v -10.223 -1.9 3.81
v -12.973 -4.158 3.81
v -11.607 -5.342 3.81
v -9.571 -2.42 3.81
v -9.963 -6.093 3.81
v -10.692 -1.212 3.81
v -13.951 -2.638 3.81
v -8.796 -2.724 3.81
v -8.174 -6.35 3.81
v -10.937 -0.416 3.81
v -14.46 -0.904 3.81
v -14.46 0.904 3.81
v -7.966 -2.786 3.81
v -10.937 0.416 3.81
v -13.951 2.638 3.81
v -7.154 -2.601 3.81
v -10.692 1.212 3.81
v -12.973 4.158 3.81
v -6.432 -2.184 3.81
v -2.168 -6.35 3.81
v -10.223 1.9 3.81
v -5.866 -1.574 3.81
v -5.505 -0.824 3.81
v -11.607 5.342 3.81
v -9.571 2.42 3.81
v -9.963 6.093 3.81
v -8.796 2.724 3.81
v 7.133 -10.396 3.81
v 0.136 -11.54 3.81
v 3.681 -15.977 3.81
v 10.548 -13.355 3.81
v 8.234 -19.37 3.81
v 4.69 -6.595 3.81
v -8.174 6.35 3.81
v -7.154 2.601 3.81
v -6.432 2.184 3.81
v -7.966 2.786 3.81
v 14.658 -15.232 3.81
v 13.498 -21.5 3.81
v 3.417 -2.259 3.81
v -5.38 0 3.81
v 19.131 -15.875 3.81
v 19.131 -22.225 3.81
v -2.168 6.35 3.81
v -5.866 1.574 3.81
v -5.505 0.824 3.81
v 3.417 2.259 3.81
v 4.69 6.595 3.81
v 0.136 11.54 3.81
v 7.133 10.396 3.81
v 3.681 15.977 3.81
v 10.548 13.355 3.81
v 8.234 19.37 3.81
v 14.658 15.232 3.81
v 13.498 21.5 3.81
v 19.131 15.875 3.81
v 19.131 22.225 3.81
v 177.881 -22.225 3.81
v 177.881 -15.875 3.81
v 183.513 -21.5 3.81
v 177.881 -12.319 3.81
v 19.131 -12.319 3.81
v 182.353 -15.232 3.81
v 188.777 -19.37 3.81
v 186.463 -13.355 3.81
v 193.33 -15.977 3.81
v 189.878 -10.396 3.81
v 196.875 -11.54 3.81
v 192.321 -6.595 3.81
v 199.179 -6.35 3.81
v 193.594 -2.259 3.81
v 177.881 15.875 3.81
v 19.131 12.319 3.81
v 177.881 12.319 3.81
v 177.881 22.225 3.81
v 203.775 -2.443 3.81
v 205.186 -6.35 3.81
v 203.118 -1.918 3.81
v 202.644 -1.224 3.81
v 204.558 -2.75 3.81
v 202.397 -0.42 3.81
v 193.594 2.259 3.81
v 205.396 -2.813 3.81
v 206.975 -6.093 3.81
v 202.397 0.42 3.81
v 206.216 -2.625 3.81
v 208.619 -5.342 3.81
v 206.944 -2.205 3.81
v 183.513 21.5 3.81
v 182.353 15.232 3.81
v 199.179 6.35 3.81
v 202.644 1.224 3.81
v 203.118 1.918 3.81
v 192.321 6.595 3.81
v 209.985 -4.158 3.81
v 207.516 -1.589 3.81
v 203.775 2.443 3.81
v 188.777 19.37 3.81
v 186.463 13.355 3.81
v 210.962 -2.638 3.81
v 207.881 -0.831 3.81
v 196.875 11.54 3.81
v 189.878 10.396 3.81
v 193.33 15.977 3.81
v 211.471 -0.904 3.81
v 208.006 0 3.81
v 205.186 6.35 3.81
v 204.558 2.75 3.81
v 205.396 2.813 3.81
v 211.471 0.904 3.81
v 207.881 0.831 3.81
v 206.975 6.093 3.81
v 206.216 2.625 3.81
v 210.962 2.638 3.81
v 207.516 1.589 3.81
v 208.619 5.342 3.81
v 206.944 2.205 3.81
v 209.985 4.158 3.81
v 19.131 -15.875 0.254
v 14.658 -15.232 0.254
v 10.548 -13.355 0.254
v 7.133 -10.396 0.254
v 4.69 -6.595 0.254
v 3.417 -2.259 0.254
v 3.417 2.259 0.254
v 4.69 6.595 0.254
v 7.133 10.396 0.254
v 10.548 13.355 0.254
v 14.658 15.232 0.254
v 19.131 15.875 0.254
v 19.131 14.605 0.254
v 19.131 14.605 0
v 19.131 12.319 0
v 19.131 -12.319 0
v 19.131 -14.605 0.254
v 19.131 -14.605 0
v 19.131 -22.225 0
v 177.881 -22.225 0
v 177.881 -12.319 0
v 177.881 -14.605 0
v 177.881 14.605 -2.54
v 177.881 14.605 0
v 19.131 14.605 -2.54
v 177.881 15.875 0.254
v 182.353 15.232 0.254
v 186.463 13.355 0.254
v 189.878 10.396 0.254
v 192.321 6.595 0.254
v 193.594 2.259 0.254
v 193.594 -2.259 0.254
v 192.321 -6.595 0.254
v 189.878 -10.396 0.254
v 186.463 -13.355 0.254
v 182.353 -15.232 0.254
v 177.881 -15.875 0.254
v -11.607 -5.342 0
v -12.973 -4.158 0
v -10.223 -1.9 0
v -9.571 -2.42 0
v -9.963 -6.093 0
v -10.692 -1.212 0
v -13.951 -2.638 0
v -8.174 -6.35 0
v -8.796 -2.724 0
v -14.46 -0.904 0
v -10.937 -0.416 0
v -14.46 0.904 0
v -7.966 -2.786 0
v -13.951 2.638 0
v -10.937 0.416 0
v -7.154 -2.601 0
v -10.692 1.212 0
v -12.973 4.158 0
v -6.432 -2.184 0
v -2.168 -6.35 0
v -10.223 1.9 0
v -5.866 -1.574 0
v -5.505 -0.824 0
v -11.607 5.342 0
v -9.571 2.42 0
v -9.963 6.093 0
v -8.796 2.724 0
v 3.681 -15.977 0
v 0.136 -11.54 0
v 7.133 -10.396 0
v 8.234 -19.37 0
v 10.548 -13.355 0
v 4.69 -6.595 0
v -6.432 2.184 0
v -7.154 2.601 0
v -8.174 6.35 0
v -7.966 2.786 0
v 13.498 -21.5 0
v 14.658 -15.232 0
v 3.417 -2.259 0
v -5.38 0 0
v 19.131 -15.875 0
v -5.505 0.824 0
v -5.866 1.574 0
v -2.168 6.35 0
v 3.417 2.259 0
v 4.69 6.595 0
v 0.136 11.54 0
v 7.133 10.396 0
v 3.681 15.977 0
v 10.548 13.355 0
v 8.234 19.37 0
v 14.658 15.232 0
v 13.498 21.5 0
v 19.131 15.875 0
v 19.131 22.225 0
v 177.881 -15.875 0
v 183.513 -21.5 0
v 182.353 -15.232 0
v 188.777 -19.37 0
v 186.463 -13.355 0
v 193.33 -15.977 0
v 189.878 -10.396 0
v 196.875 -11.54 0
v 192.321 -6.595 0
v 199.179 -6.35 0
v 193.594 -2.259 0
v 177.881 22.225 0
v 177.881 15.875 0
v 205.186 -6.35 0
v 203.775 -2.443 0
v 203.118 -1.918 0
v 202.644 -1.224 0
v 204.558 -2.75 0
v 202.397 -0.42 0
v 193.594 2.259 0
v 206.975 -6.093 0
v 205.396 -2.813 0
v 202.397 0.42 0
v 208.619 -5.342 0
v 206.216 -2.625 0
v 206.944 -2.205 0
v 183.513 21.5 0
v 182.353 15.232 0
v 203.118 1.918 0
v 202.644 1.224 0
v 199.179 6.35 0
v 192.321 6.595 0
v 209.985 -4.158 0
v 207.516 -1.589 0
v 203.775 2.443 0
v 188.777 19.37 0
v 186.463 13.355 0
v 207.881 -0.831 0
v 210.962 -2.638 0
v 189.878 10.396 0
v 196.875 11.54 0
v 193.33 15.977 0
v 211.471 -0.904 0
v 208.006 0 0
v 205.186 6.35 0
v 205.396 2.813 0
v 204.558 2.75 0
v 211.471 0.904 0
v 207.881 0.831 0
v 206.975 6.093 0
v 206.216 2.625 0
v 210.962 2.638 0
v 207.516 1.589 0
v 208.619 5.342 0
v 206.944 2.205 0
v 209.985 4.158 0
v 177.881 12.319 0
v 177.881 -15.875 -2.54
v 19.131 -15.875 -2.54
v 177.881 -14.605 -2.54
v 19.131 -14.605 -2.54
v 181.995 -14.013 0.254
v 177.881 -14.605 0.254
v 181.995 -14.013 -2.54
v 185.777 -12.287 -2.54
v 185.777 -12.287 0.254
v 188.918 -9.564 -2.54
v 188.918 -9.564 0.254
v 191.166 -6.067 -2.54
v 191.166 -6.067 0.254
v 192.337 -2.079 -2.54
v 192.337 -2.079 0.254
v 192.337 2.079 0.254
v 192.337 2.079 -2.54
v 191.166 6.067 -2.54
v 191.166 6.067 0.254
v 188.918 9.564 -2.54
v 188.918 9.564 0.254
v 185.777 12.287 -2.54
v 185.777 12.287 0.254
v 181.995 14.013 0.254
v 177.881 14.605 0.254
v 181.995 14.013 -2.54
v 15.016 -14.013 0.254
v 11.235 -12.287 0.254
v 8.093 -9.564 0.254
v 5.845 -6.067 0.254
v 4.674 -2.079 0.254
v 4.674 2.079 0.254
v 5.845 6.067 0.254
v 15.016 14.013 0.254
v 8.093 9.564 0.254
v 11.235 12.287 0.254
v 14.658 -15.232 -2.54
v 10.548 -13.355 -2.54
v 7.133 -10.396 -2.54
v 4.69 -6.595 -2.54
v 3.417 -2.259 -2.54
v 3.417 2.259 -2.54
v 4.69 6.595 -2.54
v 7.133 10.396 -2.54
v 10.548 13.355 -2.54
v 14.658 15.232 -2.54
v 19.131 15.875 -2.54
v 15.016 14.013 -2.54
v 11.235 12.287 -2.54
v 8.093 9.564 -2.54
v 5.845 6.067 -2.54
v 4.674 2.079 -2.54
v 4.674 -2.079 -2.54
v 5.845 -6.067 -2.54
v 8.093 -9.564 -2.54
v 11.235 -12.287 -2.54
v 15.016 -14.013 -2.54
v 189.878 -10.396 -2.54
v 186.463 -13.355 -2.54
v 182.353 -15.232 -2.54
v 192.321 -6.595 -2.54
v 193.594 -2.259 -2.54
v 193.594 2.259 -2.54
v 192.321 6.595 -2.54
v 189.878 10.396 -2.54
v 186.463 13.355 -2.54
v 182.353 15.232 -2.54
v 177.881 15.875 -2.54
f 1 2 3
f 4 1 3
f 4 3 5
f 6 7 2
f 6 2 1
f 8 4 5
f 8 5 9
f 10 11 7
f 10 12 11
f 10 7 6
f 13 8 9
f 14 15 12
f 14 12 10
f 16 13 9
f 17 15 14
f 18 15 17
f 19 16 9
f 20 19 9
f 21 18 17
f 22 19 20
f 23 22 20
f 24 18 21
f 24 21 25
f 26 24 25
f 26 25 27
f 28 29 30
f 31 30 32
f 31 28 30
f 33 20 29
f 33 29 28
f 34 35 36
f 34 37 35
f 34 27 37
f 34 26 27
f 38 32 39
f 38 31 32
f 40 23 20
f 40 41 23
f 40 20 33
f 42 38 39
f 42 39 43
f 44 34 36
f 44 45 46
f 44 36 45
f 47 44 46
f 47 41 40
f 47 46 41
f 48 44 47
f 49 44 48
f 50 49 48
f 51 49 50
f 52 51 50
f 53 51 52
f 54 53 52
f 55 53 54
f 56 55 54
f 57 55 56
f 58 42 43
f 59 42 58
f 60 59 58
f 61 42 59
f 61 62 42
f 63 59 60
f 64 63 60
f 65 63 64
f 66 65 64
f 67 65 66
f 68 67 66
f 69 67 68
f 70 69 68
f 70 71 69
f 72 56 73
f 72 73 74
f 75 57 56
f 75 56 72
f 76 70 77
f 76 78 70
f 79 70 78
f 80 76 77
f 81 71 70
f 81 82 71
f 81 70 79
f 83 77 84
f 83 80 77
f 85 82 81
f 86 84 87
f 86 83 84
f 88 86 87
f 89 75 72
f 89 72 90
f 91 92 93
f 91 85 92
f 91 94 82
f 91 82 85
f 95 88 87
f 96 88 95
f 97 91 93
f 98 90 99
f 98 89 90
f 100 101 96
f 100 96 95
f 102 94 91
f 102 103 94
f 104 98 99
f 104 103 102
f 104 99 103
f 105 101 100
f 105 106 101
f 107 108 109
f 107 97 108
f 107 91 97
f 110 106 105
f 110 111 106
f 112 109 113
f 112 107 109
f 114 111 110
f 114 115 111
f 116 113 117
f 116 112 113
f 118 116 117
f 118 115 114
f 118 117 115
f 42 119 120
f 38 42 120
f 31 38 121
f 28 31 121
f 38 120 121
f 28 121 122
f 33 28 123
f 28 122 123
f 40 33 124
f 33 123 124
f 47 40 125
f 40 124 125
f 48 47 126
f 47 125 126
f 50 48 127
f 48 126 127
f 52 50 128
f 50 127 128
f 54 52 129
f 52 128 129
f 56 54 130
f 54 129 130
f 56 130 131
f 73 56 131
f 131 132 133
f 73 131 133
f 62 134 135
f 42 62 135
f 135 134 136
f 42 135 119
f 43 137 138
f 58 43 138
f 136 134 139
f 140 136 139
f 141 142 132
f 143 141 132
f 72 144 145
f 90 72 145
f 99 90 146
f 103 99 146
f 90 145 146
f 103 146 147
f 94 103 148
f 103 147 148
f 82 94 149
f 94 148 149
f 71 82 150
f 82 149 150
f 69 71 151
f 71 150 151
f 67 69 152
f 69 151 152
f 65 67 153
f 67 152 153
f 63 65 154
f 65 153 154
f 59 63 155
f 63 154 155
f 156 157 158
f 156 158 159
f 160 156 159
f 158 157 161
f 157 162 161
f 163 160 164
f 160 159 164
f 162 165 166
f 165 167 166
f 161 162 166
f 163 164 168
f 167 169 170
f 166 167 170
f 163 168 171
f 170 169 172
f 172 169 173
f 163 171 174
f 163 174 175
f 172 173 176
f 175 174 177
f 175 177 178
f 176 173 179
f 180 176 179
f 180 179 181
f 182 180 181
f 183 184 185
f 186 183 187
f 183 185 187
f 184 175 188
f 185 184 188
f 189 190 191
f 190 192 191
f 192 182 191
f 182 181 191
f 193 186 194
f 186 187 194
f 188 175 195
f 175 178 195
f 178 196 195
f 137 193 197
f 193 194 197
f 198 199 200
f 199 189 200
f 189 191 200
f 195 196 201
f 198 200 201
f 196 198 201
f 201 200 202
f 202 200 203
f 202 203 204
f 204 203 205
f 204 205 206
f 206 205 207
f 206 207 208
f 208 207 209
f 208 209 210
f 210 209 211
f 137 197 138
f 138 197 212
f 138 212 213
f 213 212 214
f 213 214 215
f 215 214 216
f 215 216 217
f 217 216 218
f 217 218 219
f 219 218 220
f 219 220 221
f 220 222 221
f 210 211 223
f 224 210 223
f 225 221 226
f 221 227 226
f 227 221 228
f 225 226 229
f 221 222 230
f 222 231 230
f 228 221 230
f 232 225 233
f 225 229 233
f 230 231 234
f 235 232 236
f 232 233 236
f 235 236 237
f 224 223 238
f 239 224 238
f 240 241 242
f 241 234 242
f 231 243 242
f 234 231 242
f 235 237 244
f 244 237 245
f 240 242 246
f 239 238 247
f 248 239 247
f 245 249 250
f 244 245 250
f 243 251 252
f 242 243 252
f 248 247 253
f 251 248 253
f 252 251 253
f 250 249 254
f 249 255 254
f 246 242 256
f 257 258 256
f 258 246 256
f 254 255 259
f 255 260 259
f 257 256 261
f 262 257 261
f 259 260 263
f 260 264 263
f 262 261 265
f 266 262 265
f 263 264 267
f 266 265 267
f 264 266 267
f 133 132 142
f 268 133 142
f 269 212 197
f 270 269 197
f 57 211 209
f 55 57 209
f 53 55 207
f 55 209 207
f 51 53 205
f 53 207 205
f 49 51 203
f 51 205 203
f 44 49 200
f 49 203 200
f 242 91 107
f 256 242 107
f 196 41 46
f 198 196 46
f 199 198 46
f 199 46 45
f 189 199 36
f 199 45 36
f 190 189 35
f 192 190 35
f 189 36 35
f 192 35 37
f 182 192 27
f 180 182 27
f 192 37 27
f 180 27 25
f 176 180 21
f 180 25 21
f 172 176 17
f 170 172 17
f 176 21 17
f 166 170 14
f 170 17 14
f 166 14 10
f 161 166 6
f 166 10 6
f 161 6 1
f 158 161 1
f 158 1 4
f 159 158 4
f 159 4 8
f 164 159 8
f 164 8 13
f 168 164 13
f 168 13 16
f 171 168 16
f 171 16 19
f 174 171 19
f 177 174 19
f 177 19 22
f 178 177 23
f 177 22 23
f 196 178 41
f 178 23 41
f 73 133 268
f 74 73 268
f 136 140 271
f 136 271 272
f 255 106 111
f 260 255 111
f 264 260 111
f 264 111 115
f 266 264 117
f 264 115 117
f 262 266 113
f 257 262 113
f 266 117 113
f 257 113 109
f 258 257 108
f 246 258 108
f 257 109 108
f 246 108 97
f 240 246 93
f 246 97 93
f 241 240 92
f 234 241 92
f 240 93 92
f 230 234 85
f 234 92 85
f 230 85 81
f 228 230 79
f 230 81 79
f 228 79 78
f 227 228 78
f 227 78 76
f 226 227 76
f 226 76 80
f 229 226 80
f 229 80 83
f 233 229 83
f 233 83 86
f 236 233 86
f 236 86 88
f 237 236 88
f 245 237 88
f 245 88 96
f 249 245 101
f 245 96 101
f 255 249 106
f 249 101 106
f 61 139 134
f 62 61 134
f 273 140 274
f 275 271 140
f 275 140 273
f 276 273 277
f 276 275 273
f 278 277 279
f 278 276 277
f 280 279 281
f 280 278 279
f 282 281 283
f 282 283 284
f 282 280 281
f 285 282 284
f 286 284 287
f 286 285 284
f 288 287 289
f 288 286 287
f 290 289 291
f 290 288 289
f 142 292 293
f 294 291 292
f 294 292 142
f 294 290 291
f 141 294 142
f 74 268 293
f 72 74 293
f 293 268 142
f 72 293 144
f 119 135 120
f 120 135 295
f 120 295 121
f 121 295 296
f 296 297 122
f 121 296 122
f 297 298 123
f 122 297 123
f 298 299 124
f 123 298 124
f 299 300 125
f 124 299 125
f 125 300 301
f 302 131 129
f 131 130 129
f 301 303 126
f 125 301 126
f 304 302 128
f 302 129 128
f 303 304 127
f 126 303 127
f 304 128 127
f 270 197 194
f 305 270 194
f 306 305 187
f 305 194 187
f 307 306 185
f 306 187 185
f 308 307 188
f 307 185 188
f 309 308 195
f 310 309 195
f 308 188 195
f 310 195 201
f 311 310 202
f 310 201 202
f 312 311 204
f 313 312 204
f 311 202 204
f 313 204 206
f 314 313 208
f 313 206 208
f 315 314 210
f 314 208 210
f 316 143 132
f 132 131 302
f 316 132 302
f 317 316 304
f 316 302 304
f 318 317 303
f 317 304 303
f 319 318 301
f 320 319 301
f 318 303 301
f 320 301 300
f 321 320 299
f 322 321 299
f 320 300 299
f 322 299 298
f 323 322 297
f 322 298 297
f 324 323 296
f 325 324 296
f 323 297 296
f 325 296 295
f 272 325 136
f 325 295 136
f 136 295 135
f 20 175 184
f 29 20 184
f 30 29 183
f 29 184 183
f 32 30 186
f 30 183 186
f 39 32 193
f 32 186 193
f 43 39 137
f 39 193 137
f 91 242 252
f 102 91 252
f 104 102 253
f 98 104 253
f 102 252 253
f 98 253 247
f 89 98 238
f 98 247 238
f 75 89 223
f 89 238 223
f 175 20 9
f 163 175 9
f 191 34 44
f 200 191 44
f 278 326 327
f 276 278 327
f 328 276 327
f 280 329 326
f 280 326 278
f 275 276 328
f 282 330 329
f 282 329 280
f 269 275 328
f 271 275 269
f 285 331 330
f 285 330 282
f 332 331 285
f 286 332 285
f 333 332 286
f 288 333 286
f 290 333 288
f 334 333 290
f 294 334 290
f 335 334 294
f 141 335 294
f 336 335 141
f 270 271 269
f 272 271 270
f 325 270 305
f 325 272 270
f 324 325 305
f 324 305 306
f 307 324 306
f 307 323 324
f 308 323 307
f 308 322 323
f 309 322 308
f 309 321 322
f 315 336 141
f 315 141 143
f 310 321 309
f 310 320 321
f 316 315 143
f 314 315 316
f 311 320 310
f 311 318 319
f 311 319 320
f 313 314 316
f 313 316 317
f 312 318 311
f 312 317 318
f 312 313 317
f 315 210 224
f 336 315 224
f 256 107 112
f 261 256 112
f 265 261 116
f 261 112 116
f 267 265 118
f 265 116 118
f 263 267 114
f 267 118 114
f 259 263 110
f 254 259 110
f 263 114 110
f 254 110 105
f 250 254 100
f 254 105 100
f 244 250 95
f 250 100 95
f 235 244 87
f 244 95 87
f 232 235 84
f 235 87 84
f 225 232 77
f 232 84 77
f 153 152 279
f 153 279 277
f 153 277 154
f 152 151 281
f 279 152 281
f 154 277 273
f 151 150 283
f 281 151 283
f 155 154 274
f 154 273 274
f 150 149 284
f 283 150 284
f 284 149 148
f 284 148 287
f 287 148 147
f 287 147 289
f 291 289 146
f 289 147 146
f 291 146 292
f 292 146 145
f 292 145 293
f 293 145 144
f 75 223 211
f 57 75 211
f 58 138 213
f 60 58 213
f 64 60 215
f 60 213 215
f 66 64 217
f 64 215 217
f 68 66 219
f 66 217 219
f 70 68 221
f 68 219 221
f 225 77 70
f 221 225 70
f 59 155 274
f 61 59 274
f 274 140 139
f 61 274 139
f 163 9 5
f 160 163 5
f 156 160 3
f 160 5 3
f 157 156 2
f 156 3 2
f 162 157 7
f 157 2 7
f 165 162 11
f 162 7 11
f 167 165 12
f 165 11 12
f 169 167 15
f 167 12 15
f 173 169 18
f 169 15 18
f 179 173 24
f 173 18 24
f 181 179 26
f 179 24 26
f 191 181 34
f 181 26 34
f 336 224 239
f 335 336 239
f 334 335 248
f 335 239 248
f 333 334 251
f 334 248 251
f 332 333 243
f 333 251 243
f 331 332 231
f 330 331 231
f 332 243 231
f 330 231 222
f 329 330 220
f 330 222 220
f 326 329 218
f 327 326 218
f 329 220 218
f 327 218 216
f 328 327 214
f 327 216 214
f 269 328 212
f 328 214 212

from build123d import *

# Parameters (mm, degrees)
BOSS_EXTRUDE5_DEPTH       = 3.81
SKETCH2_W                 = 158.75
SKETCH2_H                 = 1.27
BOSS_EXTRUDE14_DEPTH      = 2.54
BOSS_EXTRUDE14_DEPTH_BACK = 0.254
SKETCH3_R                 = 2.794
SKETCH3_R_2               = 2.820459539
BOSS_EXTRUDE15_DEPTH      = 3.81


with BuildPart() as part:
    # Sketch1 → Boss-Extrude5 (new body)
    with BuildSketch(Plane.XY):
        with BuildLine():
            Line((19.130596058, -22.225), (177.880596058, -22.225))
            ThreePointArc((177.880596058, -22.225), (200.105596058, 0), (177.880596058, 22.225))
            Line((177.880596058, 22.225), (19.130596058, 22.225))
            ThreePointArc((19.130596058, 22.225), (-3.094403942, 0), (19.130596058, -22.225))
        make_face()
        with BuildLine():
            Line((19.130596058, -12.319), (19.130596058, -15.875))
            ThreePointArc((19.130596058, -15.875), (3.255596058, 0), (19.130596058, 15.875))
            Line((19.130596058, 15.875), (19.130596058, 12.319))
            Line((19.130596058, 12.319), (177.880596058, 12.319))
            Line((177.880596058, 12.319), (177.880596058, 15.875))
            ThreePointArc((177.880596058, 15.875), (193.755596058, 0), (177.880596058, -15.875))
            Line((177.880596058, -15.875), (177.880596058, -12.319))
            Line((177.880596058, -12.319), (19.130596058, -12.319))
        make_face(mode=Mode.SUBTRACT)
    extrude(amount=BOSS_EXTRUDE5_DEPTH)

    # Sketch2 → Boss-Extrude14 (add, two sides)
    with BuildSketch(Plane(origin=(0, 0, 0), x_dir=(-1, 0, 0), z_dir=(0, 0, -1))) as boss_extrude14_sk:
        with BuildLine():
            ThreePointArc((-177.880596058, -14.605), (-192.485596058, 0), (-177.880596058, 14.605))
            Line((-177.880596058, 14.605), (-177.880596058, 15.875))
            ThreePointArc((-177.880596058, 15.875), (-193.755596058, 0), (-177.880596058, -15.875))
            Line((-177.880596058, -15.875), (-177.880596058, -14.605))
        make_face()
        Polygon((-177.880596058, 15.875), (-177.880596058, 14.605), (-19.130596058, 14.605), (-19.130596058, 14.665246221), (-19.130596058, 15.875), align=None)
        with Locations((-98.505596058, -15.24)):
            Rectangle(SKETCH2_W, SKETCH2_H)
        with BuildLine():
            Line((-19.130596058, 14.665246221), (-19.130596058, 14.605))
            ThreePointArc((-19.130596058, 14.605), (-4.525596058, 0), (-19.130596058, -14.605))
            Line((-19.130596058, -14.605), (-19.130596058, -15.875))
            ThreePointArc((-19.130596058, -15.875), (-3.255596058, 0), (-19.130596058, 15.875))
            Line((-19.130596058, 15.875), (-19.130596058, 14.665246221))
        make_face()
    extrude(amount=BOSS_EXTRUDE14_DEPTH)
    extrude(boss_extrude14_sk.sketch, amount=-BOSS_EXTRUDE14_DEPTH_BACK)

    # Sketch3 → Boss-Extrude15 (add)
    with BuildSketch(Plane.XY.offset(3.81)):
        with BuildLine():
            Line((-8.174403942, 6.35), (-2.167951427, 6.35))
            ThreePointArc((-2.167951427, 6.35), (-3.094403942, 0), (-2.167951427, -6.35))
            Line((-2.167951427, -6.35), (-8.174403942, -6.35))
            ThreePointArc((-8.174403942, -6.35), (-14.524403942, 0), (-8.174403942, 6.35))
        make_face()
        with Locations((-8.174403942, 0)):
            Circle(SKETCH3_R, mode=Mode.SUBTRACT)
        with BuildLine():
            Line((205.185596058, -6.35), (199.179143544, -6.35))
            ThreePointArc((199.179143544, -6.35), (200.105596058, 0), (199.179143544, 6.35))
            Line((199.179143544, 6.35), (205.185596058, 6.35))
            ThreePointArc((205.185596058, 6.35), (211.535596058, 0), (205.185596058, -6.35))
        make_face()
        with Locations((205.185596058, 0)):
            Circle(SKETCH3_R_2, mode=Mode.SUBTRACT)
    extrude(amount=-BOSS_EXTRUDE15_DEPTH)


solid = part.part
